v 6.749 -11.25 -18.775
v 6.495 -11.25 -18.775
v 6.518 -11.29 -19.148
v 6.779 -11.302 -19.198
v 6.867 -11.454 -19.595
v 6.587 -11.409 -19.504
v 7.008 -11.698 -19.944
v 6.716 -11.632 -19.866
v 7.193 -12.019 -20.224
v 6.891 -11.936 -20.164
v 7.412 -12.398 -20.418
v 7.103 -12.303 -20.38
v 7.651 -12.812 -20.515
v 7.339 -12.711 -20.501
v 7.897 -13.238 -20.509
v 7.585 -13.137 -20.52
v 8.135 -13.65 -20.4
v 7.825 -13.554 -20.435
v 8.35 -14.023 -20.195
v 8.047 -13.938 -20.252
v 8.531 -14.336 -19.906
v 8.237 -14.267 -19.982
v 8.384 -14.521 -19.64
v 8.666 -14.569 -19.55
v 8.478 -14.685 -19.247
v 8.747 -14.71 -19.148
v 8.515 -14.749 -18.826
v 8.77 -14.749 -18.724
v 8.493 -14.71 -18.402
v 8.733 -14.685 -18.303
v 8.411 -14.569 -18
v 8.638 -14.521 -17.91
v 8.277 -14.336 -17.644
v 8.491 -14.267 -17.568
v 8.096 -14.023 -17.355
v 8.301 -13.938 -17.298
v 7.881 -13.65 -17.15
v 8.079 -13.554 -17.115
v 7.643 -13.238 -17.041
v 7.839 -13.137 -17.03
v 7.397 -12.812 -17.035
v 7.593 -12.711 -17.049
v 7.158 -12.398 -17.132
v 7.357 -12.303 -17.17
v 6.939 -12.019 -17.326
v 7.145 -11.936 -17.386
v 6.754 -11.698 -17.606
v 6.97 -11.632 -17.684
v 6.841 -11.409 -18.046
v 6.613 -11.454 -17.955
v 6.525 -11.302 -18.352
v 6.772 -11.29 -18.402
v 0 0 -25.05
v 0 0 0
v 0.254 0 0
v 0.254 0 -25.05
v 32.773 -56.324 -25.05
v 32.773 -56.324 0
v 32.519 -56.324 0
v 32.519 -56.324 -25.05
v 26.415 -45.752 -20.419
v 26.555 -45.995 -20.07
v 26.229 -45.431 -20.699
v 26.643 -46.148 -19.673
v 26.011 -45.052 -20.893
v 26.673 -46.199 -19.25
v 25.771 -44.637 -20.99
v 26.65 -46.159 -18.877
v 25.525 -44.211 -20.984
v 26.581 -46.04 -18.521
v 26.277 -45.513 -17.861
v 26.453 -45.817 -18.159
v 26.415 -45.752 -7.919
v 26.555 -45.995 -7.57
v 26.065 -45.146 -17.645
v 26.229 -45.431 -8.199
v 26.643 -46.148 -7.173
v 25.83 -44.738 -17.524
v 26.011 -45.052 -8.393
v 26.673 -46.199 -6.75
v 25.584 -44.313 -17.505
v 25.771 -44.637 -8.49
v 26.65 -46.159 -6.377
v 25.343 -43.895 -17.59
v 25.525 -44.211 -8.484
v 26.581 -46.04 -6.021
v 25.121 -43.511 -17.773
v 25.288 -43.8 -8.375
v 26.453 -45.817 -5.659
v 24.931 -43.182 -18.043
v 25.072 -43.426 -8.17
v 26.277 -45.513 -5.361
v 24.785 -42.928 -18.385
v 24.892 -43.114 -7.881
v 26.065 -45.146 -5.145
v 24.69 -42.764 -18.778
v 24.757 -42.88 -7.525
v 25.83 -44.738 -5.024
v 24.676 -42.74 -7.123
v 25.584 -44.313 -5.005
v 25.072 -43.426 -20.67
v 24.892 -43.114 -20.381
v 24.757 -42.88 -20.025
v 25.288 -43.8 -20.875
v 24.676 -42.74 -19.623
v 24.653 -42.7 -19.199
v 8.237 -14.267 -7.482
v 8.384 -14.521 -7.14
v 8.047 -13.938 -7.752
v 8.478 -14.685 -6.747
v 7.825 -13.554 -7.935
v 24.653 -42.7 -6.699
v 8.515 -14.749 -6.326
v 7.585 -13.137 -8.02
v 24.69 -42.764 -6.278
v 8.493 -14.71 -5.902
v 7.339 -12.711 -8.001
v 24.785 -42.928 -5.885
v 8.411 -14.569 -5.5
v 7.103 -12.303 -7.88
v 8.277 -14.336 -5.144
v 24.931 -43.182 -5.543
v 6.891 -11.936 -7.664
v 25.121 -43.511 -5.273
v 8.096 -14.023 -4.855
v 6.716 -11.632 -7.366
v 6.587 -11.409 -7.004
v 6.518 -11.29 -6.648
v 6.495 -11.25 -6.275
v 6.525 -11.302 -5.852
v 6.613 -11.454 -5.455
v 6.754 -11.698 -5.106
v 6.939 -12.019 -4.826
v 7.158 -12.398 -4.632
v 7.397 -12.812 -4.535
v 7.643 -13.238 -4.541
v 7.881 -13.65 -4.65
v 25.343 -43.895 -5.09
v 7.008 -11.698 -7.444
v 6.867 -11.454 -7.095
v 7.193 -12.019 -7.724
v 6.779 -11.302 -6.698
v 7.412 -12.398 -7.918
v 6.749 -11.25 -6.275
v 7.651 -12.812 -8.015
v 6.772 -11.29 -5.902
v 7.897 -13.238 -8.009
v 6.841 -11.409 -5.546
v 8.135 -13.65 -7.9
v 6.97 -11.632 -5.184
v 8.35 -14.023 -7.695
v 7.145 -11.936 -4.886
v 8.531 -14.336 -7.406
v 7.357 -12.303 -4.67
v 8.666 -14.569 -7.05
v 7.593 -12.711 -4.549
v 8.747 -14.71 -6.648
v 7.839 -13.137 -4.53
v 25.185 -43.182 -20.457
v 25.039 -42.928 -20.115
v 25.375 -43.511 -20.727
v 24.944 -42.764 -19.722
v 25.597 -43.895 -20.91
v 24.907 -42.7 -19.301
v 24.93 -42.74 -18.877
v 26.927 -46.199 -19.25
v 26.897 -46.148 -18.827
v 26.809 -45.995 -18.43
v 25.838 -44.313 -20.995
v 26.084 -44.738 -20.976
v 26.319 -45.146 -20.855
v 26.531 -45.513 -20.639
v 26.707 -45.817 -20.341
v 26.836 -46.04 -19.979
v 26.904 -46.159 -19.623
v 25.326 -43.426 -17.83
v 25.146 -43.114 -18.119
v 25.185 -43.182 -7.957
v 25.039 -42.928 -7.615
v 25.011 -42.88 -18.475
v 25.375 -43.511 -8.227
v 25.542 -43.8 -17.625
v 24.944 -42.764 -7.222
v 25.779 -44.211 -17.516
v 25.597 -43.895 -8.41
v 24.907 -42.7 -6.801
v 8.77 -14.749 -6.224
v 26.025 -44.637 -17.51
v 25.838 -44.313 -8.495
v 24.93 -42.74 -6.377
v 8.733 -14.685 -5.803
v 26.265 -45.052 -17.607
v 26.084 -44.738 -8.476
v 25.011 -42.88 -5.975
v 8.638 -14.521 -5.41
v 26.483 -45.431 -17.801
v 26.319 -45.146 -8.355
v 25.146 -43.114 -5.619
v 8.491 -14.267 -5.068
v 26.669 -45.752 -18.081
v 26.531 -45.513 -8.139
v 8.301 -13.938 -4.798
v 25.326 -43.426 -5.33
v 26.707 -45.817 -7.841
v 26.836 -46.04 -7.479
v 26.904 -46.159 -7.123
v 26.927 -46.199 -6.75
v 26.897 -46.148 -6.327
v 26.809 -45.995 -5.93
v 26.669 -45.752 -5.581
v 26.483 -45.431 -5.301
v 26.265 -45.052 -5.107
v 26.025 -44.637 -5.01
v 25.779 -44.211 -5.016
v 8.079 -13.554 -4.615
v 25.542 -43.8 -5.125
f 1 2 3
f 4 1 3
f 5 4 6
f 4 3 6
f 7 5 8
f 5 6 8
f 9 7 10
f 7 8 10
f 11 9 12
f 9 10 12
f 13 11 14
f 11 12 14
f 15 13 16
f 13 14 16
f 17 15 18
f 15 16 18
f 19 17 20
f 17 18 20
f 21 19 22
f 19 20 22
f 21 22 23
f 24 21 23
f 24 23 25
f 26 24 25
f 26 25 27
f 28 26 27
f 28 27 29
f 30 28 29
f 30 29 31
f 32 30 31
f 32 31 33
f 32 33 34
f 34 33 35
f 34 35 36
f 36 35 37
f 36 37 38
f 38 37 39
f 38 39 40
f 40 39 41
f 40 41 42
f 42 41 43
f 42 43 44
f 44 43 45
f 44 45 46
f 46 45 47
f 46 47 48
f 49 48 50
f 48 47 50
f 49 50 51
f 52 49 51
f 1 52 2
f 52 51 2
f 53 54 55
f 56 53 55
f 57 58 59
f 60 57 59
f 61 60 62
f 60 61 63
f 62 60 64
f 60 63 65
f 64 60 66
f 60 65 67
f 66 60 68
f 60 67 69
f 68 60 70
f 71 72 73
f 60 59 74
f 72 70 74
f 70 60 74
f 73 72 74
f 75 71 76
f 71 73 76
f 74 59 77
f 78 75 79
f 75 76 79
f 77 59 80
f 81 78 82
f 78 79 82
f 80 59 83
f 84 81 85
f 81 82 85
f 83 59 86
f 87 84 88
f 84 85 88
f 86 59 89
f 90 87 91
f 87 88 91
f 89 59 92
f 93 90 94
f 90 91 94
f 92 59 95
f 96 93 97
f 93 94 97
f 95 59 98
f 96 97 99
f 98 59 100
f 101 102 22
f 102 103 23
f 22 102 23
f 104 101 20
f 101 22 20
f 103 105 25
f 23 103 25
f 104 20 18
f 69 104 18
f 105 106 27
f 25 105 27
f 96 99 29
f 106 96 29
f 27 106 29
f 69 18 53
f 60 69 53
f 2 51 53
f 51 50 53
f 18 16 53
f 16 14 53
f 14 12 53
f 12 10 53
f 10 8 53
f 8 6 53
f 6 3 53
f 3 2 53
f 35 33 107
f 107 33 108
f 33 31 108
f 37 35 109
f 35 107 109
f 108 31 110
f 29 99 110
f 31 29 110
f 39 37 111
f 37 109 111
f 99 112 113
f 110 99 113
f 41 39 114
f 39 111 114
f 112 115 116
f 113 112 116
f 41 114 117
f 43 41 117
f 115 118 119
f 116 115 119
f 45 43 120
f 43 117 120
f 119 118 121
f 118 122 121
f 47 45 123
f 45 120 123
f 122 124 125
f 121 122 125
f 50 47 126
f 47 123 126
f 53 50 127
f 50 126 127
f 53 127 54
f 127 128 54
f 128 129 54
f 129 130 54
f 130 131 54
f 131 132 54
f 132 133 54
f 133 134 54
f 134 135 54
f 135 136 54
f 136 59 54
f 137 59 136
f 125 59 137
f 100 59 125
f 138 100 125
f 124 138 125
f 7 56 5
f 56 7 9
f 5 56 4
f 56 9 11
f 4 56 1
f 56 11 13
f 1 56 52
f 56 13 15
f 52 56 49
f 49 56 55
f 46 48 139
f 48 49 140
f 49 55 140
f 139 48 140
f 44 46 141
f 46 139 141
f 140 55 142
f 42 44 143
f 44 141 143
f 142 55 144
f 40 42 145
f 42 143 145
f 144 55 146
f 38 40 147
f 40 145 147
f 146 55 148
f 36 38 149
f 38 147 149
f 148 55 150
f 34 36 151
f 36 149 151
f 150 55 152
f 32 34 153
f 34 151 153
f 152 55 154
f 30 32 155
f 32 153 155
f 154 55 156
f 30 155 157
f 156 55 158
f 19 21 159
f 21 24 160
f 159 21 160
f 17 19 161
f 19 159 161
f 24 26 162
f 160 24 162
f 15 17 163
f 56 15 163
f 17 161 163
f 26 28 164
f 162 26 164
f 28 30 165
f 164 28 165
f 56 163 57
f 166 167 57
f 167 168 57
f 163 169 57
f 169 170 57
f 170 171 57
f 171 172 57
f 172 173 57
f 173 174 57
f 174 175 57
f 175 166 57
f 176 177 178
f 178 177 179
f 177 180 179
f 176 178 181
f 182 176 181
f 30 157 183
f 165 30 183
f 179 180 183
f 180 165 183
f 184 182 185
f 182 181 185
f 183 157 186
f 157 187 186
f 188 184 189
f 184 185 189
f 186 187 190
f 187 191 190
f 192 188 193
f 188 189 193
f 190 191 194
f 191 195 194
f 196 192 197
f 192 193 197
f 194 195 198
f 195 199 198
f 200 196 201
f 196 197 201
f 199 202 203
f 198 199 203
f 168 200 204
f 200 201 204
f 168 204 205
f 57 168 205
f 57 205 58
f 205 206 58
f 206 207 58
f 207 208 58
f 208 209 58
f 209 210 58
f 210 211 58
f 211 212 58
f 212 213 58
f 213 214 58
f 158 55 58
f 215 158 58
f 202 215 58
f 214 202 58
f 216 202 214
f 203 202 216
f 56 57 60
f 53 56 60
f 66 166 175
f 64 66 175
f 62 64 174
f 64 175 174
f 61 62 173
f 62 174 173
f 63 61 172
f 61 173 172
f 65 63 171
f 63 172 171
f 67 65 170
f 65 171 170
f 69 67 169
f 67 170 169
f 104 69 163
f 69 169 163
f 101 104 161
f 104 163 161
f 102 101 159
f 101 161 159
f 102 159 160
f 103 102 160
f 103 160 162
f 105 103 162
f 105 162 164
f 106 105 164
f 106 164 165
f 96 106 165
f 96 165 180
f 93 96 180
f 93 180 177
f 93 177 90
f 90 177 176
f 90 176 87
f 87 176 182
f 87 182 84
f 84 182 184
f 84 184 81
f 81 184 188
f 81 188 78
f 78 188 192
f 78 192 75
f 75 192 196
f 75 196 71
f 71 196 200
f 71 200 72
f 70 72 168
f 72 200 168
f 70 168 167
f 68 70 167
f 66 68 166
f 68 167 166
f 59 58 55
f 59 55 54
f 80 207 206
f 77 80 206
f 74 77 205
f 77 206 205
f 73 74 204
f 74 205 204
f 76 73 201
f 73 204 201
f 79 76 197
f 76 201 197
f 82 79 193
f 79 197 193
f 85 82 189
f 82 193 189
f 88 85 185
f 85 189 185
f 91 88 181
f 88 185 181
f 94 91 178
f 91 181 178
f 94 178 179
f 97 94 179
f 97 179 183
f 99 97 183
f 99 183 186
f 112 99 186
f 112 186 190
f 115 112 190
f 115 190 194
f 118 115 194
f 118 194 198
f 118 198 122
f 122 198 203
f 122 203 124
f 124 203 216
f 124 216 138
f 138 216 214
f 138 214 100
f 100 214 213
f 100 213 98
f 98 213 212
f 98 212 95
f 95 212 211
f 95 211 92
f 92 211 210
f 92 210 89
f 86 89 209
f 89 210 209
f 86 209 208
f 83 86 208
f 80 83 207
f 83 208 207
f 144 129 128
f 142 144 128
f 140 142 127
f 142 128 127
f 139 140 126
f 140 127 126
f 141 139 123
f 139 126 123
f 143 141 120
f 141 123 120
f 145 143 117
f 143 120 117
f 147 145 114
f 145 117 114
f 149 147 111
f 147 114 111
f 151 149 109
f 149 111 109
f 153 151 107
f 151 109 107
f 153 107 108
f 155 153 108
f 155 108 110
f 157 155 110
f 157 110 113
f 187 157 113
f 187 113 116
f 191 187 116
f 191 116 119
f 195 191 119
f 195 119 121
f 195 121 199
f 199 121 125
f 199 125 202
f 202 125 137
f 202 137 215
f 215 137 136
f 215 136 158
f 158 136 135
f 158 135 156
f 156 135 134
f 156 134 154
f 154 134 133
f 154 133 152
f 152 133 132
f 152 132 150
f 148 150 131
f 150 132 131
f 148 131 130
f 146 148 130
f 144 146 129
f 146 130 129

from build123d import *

# Parameters (mm, degrees)
BOSS_EXTRUDE1_DEPTH = 25.05
SKETCH3_R           = 1.75
CUT_EXTRUDE1_DEPTH  = 73.231514091
SKETCH4_R           = 1.75
CUT_EXTRUDE2_DEPTH  = 73.231514091


with BuildPart() as part:
    # Sketch1 → Boss-Extrude1 (new body)
    with BuildSketch(Plane.XY):
        Polygon((0, 0), (0.254034118, 0), (32.772967712, -56.324445192), (32.518933594, -56.324445192), align=None)
    extrude(amount=-BOSS_EXTRUDE1_DEPTH)

    # Sketch3 → Cut-Extrude1 (cut, through all)
    with BuildSketch(Plane.ZY.offset(4.876016361)):
        with Locations(Location((-18.775, -13, 0), (0, 0, 90))):
            Circle(SKETCH3_R)
        with Locations(Location((-6.275, -13, 0), (0, 0, 90))):
            Circle(SKETCH3_R)
    extrude(amount=-CUT_EXTRUDE1_DEPTH, mode=Mode.SUBTRACT)

    # Sketch4 → Cut-Extrude2 (cut, through all)
    with BuildSketch(Plane(origin=(37.648984073, 0, 0), x_dir=(0, 0, -1), z_dir=(1, 0, 0))):
        with Locations(Location((6.75, -44.449445192, 0), (0, 0, 270))):
            Circle(SKETCH4_R)
        with Locations(Location((19.25, -44.449445192, 0), (0, 0, 270))):
            Circle(SKETCH4_R)
    extrude(amount=-CUT_EXTRUDE2_DEPTH, mode=Mode.SUBTRACT)


solid = part.part
